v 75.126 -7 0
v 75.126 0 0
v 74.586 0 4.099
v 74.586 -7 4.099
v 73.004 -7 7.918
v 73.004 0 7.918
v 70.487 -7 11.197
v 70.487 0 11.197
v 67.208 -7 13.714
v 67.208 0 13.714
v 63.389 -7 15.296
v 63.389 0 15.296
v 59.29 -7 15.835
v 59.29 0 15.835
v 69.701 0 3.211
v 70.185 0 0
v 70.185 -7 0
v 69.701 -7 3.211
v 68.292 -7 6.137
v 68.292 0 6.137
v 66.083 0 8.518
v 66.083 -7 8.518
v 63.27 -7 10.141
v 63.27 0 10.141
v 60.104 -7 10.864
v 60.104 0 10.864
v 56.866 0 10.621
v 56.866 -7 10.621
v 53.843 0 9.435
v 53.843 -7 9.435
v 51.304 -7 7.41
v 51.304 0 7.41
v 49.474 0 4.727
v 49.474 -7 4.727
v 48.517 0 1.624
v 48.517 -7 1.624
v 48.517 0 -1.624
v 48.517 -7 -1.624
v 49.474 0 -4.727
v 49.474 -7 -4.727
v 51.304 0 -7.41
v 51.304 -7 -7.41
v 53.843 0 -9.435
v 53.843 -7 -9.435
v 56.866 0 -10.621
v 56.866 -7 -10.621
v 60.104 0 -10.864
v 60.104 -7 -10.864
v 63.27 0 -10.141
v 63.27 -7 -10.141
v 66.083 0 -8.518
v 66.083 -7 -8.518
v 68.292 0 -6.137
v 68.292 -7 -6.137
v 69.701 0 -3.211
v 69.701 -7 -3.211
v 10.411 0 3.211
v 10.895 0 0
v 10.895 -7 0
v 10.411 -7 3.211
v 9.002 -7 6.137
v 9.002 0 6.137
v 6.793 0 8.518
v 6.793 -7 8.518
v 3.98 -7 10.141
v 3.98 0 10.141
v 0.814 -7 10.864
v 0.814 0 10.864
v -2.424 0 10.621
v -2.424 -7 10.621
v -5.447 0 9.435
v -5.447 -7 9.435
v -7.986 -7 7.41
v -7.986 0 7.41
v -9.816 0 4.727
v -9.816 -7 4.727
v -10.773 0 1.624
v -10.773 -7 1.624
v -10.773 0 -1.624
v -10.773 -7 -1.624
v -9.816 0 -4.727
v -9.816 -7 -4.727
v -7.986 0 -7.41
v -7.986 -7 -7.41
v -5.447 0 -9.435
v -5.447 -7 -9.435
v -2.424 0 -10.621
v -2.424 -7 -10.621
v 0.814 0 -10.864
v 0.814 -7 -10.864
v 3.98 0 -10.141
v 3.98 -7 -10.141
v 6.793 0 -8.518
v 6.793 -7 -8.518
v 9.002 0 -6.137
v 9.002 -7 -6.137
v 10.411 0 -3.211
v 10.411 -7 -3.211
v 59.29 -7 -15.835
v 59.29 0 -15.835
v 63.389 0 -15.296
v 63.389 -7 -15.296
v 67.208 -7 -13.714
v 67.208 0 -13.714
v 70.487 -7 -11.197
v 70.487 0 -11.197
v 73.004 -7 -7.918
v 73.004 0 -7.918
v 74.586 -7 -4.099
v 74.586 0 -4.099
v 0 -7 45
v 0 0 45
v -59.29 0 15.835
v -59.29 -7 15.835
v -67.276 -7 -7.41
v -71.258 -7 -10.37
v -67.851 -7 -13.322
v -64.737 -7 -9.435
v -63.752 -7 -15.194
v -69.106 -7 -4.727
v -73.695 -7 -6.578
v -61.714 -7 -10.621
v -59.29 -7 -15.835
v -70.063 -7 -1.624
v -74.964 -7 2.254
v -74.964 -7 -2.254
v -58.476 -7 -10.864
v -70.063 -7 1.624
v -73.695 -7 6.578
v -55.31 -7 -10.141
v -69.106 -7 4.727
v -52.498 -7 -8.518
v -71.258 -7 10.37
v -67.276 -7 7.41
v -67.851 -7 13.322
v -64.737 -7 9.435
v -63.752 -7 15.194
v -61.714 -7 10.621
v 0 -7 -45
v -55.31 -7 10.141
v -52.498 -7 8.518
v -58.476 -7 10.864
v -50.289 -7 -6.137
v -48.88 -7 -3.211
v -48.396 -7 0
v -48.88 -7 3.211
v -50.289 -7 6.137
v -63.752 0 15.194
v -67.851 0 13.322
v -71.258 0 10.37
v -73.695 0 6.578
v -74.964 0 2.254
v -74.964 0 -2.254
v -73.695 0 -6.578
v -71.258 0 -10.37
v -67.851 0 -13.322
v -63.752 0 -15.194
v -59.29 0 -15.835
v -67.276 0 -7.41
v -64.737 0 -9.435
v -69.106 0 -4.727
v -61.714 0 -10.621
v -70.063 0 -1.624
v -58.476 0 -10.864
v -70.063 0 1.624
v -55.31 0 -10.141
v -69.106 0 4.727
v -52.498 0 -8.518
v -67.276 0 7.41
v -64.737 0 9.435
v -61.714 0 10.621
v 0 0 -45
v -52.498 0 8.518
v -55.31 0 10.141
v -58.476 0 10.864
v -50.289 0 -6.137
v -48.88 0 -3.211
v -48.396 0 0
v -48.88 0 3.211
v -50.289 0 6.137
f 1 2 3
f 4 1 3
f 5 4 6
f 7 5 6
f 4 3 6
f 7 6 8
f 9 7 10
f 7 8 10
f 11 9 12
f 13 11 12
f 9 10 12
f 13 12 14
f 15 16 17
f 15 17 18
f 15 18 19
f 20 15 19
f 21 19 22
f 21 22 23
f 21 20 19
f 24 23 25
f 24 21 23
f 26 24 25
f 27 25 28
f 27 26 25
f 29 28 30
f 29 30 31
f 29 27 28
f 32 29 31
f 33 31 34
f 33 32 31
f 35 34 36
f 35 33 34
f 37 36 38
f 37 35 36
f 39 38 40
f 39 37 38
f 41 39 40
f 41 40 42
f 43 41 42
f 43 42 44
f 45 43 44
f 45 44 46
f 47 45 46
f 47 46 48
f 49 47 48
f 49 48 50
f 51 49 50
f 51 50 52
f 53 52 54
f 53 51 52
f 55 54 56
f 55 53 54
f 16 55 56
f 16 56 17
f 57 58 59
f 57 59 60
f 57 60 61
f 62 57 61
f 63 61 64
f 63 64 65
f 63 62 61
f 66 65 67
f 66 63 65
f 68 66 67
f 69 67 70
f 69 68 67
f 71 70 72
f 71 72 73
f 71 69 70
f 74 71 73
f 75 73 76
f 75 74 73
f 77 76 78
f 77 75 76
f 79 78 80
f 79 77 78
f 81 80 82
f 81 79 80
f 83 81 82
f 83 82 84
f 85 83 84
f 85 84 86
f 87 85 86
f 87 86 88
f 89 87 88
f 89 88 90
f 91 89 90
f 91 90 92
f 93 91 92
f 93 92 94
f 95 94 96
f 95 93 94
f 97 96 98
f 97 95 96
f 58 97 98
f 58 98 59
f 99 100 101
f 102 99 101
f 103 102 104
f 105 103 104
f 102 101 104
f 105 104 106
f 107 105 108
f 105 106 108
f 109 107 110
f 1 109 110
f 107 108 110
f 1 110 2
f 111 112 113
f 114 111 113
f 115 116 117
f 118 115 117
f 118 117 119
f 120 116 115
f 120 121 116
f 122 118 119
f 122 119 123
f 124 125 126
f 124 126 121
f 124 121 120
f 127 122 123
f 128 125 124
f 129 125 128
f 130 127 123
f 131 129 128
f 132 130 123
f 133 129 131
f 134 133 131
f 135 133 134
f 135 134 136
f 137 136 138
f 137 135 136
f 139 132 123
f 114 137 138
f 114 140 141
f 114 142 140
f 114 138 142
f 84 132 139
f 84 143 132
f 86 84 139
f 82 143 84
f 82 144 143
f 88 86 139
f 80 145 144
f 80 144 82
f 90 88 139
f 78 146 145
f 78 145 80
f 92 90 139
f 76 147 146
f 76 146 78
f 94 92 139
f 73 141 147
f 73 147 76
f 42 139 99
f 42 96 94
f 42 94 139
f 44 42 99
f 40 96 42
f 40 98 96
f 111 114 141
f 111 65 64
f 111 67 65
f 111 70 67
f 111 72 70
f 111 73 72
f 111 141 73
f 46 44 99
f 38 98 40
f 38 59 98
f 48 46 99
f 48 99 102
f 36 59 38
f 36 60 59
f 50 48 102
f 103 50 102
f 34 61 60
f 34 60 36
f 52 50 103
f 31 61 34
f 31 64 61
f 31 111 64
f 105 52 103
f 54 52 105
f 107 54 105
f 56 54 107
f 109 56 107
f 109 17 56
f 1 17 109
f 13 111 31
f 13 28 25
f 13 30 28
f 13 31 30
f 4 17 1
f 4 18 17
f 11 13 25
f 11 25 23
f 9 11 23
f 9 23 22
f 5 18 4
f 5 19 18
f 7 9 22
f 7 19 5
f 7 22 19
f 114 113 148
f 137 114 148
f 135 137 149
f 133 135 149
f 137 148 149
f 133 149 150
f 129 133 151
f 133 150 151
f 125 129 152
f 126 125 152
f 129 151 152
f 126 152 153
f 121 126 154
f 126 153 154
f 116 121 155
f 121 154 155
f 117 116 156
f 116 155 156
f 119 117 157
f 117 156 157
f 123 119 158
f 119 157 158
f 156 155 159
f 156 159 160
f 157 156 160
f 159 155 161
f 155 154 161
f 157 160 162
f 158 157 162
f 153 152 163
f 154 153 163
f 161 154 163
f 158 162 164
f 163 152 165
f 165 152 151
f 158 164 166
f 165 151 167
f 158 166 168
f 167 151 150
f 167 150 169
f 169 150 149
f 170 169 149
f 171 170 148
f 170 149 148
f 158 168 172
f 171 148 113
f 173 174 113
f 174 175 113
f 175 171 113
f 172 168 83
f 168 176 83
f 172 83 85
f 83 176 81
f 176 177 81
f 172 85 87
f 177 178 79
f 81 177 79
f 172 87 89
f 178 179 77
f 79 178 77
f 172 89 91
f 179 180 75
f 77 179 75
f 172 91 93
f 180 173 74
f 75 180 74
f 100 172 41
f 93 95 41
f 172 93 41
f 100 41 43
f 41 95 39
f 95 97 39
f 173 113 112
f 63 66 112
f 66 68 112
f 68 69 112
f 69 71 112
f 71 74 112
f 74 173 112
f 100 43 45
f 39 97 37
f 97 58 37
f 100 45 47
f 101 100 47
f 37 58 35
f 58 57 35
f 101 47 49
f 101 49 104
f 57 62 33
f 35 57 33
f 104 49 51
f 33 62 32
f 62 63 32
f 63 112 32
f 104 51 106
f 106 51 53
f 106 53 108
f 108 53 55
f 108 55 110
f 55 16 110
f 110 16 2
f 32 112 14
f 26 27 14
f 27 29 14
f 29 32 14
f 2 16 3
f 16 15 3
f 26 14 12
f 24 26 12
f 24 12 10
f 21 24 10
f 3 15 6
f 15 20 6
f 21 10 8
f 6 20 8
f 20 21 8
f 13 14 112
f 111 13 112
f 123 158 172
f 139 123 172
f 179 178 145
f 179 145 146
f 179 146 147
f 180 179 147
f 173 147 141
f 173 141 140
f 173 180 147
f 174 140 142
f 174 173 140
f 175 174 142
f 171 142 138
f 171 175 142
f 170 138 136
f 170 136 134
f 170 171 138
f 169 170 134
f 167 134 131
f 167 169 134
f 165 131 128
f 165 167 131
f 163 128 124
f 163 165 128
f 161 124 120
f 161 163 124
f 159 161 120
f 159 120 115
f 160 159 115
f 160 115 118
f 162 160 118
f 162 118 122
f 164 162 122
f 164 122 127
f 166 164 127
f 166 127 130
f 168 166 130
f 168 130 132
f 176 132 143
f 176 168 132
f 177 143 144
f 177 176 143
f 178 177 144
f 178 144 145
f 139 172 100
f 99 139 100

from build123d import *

# Parameters (mm, degrees)
F0_R     = 10.894565
F1_DEPTH = 7


with BuildPart() as f1:
    # F0 (on Front) → F1 (new body)
    with BuildSketch(Plane.XZ):
        with BuildLine():
            ThreePointArc((-43.45474, 0), (-48.092824, 11.197327), (-59.290151, 15.835411))
            ThreePointArc((-59.290151, 15.835411), (-75.125562, 0), (-59.290151, -15.835411))
            ThreePointArc((-59.290151, -15.835411), (-48.092824, -11.197327), (-43.45474, 0))
        make_face()
        with Locations((-59.290151, 0)):
            Circle(F0_R, mode=Mode.SUBTRACT)
        Polygon((59.290151, -15.835411), (0, -15.835411), (-59.290151, -15.835411), (0, -45), align=None)
        Polygon((-59.290151, 15.835411), (0, 15.835411), (59.290151, 15.835411), (0, 45), align=None)
        with BuildLine():
            ThreePointArc((0, 15.835411), (11.197327, 11.197327), (15.835411, 0))
            ThreePointArc((15.835411, 0), (11.197327, -11.197327), (0, -15.835411))
            Line((0, -15.835411), (59.290151, -15.835411))
            ThreePointArc((59.290151, -15.835411), (43.45474, 0), (59.290151, 15.835411))
            Line((59.290151, 15.835411), (0, 15.835411))
        make_face()
        with BuildLine():
            ThreePointArc((0, -15.835411), (-15.835411, 0), (0, 15.835411))
            Line((0, 15.835411), (-59.290151, 15.835411))
            ThreePointArc((-59.290151, 15.835411), (-48.092824, 11.197327), (-43.45474, 0))
            ThreePointArc((-43.45474, 0), (-48.092824, -11.197327), (-59.290151, -15.835411))
            Line((-59.290151, -15.835411), (0, -15.835411))
        make_face()
        with BuildLine():
            ThreePointArc((75.125562, 0), (70.487478, 11.197327), (59.290151, 15.835411))
            ThreePointArc((59.290151, 15.835411), (43.45474, 0), (59.290151, -15.835411))
            ThreePointArc((59.290151, -15.835411), (70.487478, -11.197327), (75.125562, 0))
        make_face()
        with Locations((59.290151, 0)):
            Circle(F0_R, mode=Mode.SUBTRACT)
        with BuildLine():
            ThreePointArc((0, -15.835411), (11.197327, -11.197327), (15.835411, 0))
            ThreePointArc((15.835411, 0), (11.197327, 11.197327), (0, 15.835411))
            ThreePointArc((0, 15.835411), (-15.835411, 0), (0, -15.835411))
        make_face()
        Circle(F0_R, mode=Mode.SUBTRACT)
    extrude(amount=F1_DEPTH)


solid = f1.part
